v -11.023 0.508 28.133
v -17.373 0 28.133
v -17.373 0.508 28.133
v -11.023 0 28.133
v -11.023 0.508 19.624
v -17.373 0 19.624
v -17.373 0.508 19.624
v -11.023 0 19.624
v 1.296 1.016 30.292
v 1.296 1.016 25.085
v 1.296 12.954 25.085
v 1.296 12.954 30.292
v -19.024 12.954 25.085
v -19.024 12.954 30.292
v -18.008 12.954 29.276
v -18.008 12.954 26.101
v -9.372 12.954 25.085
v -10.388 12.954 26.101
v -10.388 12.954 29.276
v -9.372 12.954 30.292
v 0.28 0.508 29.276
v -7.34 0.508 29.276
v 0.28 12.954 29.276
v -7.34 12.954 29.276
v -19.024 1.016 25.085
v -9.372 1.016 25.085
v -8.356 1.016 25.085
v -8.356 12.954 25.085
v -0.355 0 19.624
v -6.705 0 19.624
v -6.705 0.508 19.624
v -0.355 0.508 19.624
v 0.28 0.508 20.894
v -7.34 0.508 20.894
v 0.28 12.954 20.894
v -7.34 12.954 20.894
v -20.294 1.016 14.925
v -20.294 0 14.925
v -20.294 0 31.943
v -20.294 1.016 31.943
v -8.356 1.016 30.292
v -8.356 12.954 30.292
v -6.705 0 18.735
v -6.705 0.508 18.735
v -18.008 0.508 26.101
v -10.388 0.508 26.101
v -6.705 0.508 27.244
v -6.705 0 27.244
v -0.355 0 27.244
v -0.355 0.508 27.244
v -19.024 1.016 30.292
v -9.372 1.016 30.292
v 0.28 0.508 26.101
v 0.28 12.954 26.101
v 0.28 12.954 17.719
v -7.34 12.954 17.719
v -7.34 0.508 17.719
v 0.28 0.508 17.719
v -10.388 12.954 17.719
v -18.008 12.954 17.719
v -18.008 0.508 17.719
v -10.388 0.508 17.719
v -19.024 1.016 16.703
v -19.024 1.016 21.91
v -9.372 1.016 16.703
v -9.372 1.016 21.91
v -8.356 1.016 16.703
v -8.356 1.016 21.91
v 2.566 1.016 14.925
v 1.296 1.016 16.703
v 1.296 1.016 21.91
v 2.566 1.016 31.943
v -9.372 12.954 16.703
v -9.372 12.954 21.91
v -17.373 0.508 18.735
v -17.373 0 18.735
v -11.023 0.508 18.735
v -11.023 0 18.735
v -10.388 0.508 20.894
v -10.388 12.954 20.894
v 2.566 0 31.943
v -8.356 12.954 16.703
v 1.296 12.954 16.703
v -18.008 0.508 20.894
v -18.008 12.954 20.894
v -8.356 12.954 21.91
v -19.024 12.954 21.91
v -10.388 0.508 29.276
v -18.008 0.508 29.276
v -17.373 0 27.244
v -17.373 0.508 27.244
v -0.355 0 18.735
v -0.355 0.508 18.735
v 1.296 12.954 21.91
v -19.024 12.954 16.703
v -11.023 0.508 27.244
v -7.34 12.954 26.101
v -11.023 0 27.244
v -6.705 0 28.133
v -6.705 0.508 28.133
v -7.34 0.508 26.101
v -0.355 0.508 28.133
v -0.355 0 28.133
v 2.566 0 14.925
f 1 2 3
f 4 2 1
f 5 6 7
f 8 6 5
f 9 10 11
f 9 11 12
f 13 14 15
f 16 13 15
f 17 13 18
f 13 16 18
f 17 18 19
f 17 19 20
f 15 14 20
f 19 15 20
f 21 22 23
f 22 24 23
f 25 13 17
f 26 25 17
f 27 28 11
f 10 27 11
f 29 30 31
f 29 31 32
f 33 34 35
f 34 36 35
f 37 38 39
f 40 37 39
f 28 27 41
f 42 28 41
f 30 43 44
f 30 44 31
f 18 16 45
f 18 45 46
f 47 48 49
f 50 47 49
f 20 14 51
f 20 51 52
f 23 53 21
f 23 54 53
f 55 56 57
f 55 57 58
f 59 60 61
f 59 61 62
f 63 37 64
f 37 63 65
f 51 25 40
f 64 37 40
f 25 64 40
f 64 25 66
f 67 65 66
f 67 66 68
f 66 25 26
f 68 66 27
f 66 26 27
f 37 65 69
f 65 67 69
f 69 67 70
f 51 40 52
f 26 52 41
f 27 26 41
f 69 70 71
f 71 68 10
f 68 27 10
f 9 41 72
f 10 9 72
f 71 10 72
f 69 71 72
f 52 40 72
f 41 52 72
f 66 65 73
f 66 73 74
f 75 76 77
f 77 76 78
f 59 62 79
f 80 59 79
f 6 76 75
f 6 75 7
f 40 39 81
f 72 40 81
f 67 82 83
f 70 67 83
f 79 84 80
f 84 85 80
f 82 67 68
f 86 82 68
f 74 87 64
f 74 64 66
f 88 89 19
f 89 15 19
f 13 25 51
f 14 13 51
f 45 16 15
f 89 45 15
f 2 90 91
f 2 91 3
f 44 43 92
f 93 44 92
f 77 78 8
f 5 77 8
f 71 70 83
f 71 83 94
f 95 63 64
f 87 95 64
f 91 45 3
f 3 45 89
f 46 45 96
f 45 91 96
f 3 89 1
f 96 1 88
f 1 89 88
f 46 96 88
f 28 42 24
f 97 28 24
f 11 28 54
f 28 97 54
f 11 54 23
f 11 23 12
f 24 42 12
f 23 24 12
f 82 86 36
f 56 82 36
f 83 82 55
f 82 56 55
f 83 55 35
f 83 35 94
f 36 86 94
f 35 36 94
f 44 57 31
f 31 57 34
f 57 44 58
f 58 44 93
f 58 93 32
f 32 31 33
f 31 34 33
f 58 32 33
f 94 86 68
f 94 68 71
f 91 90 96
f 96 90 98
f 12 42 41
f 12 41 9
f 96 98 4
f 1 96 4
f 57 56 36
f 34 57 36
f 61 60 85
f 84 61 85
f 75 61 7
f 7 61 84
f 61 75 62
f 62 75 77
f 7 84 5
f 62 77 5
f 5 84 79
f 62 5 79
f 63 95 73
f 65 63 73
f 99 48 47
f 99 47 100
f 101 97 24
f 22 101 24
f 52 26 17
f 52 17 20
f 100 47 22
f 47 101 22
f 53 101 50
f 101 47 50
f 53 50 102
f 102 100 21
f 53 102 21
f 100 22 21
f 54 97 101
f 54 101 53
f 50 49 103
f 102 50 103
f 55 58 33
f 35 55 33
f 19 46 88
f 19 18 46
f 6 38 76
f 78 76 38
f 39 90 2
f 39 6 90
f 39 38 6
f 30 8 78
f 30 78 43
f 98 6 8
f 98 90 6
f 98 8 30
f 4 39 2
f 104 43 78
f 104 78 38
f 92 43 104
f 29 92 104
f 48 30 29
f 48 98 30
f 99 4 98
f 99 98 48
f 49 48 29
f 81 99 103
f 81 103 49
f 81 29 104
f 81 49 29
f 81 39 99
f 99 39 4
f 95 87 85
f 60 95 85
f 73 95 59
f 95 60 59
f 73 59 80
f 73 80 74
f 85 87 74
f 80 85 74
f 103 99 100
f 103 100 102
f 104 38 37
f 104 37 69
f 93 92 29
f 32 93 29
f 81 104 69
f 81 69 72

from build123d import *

# Parameters (mm, degrees)
F0_W      = 25.4
F0_H      = 22.86
F1_DEPTH  = 1.016
F2_W      = 6.35
F2_H      = 0.889
F3_DEPTH  = 25.4
F4_W      = 9.652
F4_H      = 5.207
F4_W_2    = 7.62
F4_H_2    = 3.175
F5_DEPTH  = 12.954
F6_W      = 25.4
F6_H      = 2.794
F6_H_2    = 3.048
F7_DEPTH  = 12.955
F8_W      = 2.54
F8_H      = 17.018
F9_DEPTH  = 25.4
F10_DEPTH = 0.508


with BuildPart() as f1:
    # F0 (on Front) → F1 (new body)
    with BuildSketch(Plane.XZ):
        with Locations((-10.1341714823, 23.5612259712)):
            Rectangle(F0_W, F0_H)
    extrude(amount=-F1_DEPTH)

    # F2 (on face) → F3 (cut)
    with BuildSketch(Plane.XZ):
        with Locations((-14.1981714823, 27.6887259712)):
            Rectangle(F2_W, F2_H)
        with Locations((-3.5301714823, 27.6887259712)):
            Rectangle(F2_W, F2_H)
        with Locations((-14.1981714823, 19.1797259712)):
            Rectangle(F2_W, F2_H)
        with Locations((-3.5301714823, 19.1797259712)):
            Rectangle(F2_W, F2_H)
    extrude(amount=-F3_DEPTH, mode=Mode.SUBTRACT)

    # F4 (on face) → F5 (join)
    with BuildSketch(Plane.XZ):
        with Locations((-14.1981714823, 27.6887259712)):
            Rectangle(F4_W, F4_H)
        with Locations((-14.1981714823, 27.6887259712)):
            Rectangle(F4_W_2, F4_H_2, mode=Mode.SUBTRACT)
        with Locations((-3.5301714823, 27.6887259712)):
            Rectangle(F4_W, F4_H)
        with Locations((-3.5301714823, 27.6887259712)):
            Rectangle(F4_W_2, F4_H_2, mode=Mode.SUBTRACT)
        with Locations((-14.1981714823, 19.3067259712)):
            Rectangle(F4_W, F4_H)
        with Locations((-14.1981714823, 19.3067259712)):
            Rectangle(F4_W_2, F4_H_2, mode=Mode.SUBTRACT)
        with Locations((-3.5301714823, 19.3067259712)):
            Rectangle(F4_W, F4_H)
        with Locations((-3.5301714823, 19.3067259712)):
            Rectangle(F4_W_2, F4_H_2, mode=Mode.SUBTRACT)
    extrude(amount=-F5_DEPTH)

    # F6 (on face) → F7 (cut, through all)
    with BuildSketch(Plane.XZ):
        with Locations((-10.1341714823, 13.5282259712)):
            Rectangle(F6_W, F6_H)
        with Locations((-10.1341714823, 33.4672259712)):
            Rectangle(F6_W, F6_H_2)
    extrude(amount=-F7_DEPTH, mode=Mode.SUBTRACT)

    # F8 (on face) → F9 (cut)
    with BuildSketch(Plane.XZ):
        with Locations((-21.5641714823, 23.4342259712)):
            Rectangle(F8_W, F8_H)
    extrude(amount=-F9_DEPTH, mode=Mode.SUBTRACT)

    # F10 (cut): faces of the model
    f10_faces = [f1.faces().sort_by_distance(p)[0] for p in [
        (-14.1981714823, 1.016, 26.1837759712),
        (-3.5301714823, 1.016, 20.8116759712),
        (-14.1981714823, 1.016, 17.8017759712),
        (-7.2576214823, 1.016, 27.6887259712),
    ]]
    extrude(f10_faces, amount=-F10_DEPTH, mode=Mode.SUBTRACT)


solid = f1.part
